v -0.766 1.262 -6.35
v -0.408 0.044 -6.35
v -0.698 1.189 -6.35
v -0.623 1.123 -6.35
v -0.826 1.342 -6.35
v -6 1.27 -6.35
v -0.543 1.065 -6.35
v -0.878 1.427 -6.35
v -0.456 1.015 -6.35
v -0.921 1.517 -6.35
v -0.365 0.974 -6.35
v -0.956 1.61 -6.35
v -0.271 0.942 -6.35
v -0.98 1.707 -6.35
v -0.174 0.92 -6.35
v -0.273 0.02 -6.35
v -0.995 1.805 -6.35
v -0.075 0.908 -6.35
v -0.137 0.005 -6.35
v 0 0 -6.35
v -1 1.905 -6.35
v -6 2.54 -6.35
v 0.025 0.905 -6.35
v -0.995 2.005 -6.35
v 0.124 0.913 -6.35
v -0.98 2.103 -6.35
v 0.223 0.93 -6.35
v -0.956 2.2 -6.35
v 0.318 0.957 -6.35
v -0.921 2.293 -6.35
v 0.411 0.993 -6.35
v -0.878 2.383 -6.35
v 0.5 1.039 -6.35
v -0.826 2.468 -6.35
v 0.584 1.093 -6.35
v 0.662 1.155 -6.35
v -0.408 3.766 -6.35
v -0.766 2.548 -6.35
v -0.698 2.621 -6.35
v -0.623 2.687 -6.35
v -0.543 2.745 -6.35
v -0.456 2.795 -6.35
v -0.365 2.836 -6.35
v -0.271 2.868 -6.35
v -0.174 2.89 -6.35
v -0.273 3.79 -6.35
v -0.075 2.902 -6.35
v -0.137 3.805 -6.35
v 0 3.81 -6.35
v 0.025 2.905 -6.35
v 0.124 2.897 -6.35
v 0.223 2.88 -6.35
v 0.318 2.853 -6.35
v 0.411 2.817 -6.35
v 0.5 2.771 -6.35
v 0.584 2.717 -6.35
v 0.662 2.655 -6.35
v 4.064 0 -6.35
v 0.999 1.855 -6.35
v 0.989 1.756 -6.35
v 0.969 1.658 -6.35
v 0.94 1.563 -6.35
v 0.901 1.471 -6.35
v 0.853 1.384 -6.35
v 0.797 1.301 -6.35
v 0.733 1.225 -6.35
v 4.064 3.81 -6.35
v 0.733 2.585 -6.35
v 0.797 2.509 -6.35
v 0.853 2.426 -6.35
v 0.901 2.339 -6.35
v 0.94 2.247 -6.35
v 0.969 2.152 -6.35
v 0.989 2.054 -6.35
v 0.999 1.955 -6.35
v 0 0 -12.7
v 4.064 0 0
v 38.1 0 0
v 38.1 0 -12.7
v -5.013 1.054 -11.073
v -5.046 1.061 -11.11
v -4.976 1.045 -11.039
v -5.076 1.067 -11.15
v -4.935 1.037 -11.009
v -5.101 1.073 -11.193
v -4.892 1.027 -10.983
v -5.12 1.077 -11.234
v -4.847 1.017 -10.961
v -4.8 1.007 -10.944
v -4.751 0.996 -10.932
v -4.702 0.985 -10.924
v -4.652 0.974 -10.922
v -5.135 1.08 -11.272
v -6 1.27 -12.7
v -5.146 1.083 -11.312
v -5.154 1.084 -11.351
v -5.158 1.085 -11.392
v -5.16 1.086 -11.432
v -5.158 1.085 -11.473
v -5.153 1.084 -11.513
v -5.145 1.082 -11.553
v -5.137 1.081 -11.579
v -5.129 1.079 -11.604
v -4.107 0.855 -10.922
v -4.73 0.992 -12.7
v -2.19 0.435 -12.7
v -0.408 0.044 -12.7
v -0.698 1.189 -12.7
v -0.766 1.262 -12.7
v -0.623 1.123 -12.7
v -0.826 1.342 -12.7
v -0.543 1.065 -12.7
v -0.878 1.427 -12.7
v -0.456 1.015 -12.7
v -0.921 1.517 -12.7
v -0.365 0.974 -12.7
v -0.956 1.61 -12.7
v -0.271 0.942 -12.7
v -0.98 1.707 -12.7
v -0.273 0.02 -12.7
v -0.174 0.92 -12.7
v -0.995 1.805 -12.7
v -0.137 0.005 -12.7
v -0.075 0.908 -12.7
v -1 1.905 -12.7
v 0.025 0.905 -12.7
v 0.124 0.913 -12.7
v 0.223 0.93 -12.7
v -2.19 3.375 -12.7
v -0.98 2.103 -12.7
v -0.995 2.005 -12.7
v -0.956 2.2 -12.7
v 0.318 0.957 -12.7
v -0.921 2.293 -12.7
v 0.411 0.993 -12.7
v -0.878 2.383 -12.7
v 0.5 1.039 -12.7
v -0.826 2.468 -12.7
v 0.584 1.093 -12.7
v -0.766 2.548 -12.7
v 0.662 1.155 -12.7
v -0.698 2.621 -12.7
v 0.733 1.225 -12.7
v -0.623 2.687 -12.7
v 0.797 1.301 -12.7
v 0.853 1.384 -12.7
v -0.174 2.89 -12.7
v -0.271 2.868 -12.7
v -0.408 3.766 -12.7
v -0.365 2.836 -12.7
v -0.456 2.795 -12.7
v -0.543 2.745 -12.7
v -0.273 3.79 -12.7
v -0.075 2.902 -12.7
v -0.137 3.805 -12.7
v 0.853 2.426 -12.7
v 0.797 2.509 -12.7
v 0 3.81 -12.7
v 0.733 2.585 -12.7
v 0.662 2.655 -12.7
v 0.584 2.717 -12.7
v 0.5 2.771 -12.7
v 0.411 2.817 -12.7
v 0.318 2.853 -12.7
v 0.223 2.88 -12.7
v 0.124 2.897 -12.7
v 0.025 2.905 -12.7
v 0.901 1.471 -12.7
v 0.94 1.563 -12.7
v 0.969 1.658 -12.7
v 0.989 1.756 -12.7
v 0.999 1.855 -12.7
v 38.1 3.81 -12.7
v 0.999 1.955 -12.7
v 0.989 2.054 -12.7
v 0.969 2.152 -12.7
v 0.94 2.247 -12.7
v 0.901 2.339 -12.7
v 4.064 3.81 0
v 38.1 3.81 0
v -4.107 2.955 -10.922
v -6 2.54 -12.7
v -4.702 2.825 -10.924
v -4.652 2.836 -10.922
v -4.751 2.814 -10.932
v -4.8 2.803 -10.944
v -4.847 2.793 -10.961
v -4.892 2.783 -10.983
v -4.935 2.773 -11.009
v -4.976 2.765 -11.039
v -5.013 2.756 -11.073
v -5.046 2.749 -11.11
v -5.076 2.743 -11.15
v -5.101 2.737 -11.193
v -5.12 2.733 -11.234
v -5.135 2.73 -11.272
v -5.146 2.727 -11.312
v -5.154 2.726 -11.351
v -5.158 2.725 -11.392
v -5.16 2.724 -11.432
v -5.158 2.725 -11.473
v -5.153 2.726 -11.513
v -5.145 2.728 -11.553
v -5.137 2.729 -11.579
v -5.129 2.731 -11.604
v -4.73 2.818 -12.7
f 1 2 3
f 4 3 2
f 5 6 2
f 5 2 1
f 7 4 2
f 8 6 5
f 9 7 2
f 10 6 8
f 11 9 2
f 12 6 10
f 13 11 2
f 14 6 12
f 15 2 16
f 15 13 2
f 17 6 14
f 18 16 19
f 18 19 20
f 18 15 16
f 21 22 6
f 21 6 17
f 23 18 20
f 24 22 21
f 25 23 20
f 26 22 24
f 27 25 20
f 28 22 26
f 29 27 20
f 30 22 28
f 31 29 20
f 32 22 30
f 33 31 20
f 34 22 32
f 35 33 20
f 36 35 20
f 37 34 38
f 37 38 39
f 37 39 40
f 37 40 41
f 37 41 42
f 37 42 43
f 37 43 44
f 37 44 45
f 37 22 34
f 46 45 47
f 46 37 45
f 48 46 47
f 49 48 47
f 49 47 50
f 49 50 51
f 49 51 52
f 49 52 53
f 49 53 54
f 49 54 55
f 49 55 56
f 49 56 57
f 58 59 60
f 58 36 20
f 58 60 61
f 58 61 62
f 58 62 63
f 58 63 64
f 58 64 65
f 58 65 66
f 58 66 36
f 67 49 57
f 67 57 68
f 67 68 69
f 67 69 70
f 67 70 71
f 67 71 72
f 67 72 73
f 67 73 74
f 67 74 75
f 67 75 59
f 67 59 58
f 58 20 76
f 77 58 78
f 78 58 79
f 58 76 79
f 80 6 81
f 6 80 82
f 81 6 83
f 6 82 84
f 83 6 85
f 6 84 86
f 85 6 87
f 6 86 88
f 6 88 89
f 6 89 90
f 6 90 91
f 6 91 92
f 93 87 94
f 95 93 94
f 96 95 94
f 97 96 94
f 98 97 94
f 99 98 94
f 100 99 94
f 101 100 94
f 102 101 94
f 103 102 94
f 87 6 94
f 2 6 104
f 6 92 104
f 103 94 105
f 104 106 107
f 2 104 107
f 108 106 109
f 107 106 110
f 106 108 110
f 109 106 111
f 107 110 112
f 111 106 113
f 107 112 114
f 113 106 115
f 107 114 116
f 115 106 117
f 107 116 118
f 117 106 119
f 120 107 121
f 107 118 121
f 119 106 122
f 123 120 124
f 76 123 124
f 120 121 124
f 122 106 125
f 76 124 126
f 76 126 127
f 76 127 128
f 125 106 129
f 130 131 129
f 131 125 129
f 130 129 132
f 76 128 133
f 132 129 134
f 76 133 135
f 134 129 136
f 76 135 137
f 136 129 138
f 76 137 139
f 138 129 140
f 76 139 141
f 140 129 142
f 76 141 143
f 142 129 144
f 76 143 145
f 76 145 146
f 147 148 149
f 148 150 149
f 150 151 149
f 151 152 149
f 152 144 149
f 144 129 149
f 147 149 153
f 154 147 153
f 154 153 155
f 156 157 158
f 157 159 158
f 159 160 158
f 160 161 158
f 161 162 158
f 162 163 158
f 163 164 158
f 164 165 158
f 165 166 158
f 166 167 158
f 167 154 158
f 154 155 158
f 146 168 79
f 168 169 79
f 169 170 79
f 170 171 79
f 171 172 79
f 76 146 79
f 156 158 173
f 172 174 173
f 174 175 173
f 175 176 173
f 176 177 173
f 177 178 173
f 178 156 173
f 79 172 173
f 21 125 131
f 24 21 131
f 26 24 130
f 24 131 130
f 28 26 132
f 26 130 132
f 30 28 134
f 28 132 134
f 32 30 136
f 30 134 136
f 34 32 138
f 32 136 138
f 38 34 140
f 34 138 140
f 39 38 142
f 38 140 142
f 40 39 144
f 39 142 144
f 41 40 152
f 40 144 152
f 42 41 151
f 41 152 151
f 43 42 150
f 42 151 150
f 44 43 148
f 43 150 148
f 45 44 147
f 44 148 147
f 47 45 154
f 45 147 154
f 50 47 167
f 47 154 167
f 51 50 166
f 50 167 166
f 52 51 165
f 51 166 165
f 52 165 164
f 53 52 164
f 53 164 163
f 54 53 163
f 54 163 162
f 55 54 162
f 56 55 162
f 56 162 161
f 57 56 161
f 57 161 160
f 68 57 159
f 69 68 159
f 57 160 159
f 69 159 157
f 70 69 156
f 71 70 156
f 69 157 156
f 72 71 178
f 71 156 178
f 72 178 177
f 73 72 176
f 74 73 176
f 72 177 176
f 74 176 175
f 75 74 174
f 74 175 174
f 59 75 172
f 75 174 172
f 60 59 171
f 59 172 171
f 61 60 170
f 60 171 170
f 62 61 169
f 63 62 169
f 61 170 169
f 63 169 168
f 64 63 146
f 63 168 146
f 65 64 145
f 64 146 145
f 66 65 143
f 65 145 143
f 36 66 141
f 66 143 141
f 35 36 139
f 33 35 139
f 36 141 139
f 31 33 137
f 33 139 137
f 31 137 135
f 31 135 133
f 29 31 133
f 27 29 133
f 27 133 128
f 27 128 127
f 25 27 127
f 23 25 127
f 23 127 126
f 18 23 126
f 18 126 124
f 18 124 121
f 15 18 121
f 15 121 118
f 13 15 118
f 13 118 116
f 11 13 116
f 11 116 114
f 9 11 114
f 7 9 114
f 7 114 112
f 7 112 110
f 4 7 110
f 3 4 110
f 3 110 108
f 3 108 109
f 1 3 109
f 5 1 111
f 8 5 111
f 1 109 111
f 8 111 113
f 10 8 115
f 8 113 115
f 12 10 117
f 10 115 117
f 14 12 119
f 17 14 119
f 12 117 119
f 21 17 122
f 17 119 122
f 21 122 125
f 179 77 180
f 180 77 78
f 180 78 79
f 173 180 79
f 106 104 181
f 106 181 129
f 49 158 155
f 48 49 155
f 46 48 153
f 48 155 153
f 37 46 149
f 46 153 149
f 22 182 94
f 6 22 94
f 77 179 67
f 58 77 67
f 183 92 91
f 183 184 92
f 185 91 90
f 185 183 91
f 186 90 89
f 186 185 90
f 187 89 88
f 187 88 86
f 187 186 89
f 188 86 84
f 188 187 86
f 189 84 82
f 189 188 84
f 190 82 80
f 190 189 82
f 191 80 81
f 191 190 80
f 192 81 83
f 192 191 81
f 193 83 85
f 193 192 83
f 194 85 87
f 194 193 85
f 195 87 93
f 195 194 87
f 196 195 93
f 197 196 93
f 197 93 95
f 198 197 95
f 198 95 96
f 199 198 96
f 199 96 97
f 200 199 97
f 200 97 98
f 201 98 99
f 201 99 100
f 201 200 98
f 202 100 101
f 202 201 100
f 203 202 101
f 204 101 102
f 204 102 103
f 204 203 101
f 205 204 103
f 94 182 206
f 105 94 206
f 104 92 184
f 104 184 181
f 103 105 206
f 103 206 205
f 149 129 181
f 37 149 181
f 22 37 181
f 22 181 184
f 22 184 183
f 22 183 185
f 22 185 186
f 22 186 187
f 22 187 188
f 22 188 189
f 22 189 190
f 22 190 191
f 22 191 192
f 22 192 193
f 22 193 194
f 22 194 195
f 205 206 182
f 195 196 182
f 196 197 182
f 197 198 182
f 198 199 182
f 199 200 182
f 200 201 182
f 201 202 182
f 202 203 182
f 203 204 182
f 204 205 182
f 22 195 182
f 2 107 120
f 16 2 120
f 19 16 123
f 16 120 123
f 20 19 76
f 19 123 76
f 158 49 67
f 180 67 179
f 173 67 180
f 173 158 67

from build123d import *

# Parameters (mm, degrees)
SKETCH1_W           = 38.1
SKETCH1_H           = 12.7
BOSS_EXTRUDE1_DEPTH = 3.81
SKETCH2_W           = 4.064
SKETCH2_H           = 6.35
CUT_EXTRUDE1_DEPTH  = 4.81
SKETCH4_R           = 1
CUT_EXTRUDE2_DEPTH  = 13.7
SKETCH5_R           = 1
BOSS_EXTRUDE2_DEPTH = 6.35
CUT_EXTRUDE3_DEPTH  = 4.81
FILLET1_R           = 0.508


with BuildPart() as part:
    # Sketch1 → Boss-Extrude1 (new body)
    with BuildSketch(Plane(origin=(0, 0, 0), x_dir=(1, 0, 0), z_dir=(0, 1, 0))):
        with Locations((19.05, 6.35)):
            Rectangle(SKETCH1_W, SKETCH1_H)
    extrude(amount=BOSS_EXTRUDE1_DEPTH)

    # Sketch2 → Cut-Extrude1 (cut, through all)
    with BuildSketch(Plane(origin=(0, 3.81, 0), x_dir=(1, 0, 0), z_dir=(0, 1, 0))):
        with Locations((2.032, 3.175)):
            Rectangle(SKETCH2_W, SKETCH2_H)
    extrude(amount=-CUT_EXTRUDE1_DEPTH, mode=Mode.SUBTRACT)

    # Sketch4 → Cut-Extrude2 (cut, through all)
    with BuildSketch(Plane(origin=(0, 0, -12.7), x_dir=(-1, 0, 0), z_dir=(0, 0, -1))):
        with Locations((0, 1.905)):
            Circle(SKETCH4_R)
    extrude(amount=-CUT_EXTRUDE2_DEPTH, mode=Mode.SUBTRACT)

    # Sketch5 → Boss-Extrude2 (add)
    with BuildSketch(Plane(origin=(0, 0, -12.7), x_dir=(-1, 0, 0), z_dir=(0, 0, -1))):
        with BuildLine():
            Line((0.407900981, 3.765817506), (6, 2.54))
            Line((6, 2.54), (6, 1.27))
            Line((6, 1.27), (0.407900981, 0.044182494))
            ThreePointArc((0.407900981, 0.044182494), (-1.905, 1.905), (0.407900981, 3.765817506))
        make_face()
        with Locations((0, 1.905)):
            Circle(SKETCH5_R, mode=Mode.SUBTRACT)
    extrude(amount=-BOSS_EXTRUDE2_DEPTH)

    # Sketch6 → Cut-Extrude3 (cut, through all)
    with BuildSketch(Plane.XZ):
        Polygon((-4.73, -12.7), (-5.377139077, -10.922), (-4.107139077, -10.922), (-2.19, -12.7), align=None)
    extrude(amount=-CUT_EXTRUDE3_DEPTH, mode=Mode.SUBTRACT)

    # Fillet1
    fillet1_edges = [part.edges().sort_by_distance(p)[0] for p in [
        (-5.377139077, 1.905, -10.922),
    ]]
    fillet(fillet1_edges, radius=FILLET1_R)


solid = part.part
